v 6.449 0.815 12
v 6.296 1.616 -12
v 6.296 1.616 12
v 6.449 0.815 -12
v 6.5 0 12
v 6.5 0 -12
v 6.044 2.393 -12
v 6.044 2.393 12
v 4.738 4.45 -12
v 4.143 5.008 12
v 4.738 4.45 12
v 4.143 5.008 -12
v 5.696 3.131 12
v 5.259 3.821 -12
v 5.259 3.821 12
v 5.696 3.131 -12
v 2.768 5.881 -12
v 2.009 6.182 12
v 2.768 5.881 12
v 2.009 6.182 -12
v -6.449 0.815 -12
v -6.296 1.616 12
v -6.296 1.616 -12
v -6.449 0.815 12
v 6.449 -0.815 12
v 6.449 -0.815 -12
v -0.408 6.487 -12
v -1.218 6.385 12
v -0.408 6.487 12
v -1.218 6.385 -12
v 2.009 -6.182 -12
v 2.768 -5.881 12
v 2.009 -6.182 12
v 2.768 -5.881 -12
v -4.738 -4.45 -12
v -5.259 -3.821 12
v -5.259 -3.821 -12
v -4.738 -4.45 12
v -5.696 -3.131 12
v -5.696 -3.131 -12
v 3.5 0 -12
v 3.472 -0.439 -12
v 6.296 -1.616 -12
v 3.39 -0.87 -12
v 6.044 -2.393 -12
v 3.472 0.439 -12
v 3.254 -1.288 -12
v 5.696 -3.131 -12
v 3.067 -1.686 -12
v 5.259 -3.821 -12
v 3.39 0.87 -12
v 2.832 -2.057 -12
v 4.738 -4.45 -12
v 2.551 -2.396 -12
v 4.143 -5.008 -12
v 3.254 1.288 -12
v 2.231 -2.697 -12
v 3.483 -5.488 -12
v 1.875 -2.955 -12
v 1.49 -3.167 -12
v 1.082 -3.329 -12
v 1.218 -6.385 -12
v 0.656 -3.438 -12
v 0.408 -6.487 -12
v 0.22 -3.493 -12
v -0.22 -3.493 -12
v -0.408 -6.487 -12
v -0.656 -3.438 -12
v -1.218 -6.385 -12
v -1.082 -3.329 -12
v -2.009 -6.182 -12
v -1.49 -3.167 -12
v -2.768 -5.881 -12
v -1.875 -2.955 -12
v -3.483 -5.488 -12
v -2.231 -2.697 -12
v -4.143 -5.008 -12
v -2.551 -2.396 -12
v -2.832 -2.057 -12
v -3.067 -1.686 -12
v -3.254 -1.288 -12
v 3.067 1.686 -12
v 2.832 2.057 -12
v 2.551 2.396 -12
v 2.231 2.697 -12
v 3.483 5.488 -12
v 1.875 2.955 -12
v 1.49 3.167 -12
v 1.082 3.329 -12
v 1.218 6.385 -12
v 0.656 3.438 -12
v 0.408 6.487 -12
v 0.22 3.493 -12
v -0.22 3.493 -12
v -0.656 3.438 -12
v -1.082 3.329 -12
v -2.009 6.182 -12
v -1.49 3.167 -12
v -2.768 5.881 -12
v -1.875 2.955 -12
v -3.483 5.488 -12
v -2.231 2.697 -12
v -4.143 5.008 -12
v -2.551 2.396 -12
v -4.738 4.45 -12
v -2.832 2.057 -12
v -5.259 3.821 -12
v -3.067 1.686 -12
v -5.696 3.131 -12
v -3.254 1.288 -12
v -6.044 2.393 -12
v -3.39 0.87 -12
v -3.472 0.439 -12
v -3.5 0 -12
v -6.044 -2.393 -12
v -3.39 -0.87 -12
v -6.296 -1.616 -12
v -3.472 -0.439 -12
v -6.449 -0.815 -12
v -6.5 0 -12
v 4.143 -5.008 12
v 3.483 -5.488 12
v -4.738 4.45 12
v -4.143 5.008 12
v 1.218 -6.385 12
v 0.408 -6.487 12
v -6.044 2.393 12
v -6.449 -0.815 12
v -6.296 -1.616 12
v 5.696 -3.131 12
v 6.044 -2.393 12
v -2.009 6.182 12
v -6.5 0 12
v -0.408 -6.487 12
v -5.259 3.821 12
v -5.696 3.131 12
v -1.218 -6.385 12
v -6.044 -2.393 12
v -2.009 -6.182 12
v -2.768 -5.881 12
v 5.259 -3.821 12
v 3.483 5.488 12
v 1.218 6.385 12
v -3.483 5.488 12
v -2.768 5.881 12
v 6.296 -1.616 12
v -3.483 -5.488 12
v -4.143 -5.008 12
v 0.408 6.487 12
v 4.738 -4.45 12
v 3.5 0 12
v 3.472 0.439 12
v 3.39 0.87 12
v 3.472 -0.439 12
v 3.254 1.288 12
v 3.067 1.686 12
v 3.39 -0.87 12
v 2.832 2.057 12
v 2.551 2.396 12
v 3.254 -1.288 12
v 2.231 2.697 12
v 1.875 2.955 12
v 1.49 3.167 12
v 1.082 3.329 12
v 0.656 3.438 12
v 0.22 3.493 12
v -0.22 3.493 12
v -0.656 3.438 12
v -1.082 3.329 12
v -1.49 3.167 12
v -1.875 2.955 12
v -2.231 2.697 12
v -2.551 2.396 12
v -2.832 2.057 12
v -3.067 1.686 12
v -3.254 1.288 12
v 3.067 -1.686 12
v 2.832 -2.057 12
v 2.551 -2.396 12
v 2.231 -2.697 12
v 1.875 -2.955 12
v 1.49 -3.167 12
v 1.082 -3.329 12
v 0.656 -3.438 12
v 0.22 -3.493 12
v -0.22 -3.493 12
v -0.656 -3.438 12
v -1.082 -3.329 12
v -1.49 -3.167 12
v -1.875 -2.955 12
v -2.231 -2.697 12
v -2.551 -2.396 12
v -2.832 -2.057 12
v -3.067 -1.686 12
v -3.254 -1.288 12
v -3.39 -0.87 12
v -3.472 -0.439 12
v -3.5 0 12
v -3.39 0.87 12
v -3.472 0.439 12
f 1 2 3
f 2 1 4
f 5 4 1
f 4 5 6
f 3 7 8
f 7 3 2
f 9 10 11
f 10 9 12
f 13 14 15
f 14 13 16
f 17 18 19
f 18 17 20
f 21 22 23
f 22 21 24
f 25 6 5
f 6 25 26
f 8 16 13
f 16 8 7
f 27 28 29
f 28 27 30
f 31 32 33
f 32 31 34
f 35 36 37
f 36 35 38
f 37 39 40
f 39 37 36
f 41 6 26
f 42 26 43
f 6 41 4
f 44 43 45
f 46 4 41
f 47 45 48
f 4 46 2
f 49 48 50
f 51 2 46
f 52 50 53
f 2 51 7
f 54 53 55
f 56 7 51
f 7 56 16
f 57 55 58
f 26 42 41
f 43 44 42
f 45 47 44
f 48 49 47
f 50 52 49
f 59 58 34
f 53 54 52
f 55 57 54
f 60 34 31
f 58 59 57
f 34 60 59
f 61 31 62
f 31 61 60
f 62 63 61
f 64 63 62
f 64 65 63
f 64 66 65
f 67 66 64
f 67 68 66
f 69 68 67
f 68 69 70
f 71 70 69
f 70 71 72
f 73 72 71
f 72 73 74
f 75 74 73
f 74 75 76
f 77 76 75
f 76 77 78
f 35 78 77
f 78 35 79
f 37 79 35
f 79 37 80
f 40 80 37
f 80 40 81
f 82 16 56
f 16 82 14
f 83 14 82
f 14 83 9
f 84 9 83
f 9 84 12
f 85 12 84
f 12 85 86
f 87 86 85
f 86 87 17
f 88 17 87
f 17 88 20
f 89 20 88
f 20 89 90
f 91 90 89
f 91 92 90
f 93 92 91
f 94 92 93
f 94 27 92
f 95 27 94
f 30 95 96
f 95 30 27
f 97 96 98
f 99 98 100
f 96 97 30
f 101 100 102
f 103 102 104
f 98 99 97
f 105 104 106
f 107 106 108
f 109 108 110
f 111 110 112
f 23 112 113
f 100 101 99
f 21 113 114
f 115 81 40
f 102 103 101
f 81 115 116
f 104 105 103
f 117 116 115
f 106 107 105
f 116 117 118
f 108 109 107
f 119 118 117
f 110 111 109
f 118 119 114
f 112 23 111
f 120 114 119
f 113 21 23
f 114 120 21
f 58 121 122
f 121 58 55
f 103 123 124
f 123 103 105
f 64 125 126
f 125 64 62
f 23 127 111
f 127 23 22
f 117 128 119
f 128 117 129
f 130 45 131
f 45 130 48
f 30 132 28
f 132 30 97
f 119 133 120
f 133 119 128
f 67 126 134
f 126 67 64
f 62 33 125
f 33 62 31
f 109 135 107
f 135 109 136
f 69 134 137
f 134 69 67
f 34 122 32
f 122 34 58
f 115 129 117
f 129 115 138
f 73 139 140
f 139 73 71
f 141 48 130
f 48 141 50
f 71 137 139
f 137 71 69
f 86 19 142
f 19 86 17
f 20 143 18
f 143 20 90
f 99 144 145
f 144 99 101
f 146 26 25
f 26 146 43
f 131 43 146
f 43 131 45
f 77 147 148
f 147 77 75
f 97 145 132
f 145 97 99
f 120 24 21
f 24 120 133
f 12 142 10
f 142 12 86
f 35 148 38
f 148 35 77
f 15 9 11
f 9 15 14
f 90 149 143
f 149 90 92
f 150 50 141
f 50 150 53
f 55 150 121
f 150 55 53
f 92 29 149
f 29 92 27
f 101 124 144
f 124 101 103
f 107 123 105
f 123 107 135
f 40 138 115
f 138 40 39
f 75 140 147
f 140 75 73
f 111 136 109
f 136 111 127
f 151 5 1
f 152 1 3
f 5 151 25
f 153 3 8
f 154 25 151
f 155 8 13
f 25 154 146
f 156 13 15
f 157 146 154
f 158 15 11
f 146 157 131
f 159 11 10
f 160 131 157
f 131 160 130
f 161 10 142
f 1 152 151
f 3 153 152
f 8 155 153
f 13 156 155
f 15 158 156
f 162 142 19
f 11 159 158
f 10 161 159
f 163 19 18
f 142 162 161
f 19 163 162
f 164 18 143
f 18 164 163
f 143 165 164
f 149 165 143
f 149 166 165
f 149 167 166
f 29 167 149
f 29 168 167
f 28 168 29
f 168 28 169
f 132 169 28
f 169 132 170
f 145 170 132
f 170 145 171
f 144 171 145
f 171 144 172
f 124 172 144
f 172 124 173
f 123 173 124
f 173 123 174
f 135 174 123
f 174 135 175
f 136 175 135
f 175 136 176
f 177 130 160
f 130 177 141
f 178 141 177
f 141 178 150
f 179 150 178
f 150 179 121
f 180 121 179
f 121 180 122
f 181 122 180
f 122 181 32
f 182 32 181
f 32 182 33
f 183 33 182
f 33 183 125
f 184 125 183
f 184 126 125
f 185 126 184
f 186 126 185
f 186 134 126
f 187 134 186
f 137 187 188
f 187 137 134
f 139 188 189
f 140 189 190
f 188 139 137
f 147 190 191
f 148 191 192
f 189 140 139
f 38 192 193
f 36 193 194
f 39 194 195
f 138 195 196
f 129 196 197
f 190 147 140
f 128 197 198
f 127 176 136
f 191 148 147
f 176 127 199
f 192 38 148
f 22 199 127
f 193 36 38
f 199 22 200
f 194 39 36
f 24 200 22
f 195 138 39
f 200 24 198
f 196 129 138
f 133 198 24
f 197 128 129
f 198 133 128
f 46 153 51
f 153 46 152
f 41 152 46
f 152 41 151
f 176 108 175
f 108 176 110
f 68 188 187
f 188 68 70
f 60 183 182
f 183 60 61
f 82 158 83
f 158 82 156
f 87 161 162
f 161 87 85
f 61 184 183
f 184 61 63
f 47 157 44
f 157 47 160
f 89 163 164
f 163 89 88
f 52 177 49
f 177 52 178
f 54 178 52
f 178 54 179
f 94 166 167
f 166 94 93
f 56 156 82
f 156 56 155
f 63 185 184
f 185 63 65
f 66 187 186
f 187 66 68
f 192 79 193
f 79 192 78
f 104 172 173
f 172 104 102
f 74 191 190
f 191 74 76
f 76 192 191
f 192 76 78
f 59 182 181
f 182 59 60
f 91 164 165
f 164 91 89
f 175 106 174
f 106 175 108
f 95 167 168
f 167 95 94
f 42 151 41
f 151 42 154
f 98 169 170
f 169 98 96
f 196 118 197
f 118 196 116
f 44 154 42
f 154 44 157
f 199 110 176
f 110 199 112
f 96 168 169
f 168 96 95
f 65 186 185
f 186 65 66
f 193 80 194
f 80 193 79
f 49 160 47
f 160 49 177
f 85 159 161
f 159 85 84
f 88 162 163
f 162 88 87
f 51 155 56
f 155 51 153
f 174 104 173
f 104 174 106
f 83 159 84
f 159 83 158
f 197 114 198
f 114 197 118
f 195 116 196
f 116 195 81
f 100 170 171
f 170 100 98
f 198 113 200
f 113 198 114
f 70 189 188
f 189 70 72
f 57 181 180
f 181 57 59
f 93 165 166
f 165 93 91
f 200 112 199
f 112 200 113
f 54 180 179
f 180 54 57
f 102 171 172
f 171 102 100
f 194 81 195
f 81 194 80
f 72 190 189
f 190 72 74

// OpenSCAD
$fn = 50;


difference() {
	union() {
		translate(v = [0, 0, -12.0000000000]) {
			cylinder(h = 24, r = 6.5000000000);
		}
	}
	union() {
		translate(v = [0, 0, -100.0000000000]) {
			cylinder(h = 200, r = 3.5000000000);
		}
	}
}
